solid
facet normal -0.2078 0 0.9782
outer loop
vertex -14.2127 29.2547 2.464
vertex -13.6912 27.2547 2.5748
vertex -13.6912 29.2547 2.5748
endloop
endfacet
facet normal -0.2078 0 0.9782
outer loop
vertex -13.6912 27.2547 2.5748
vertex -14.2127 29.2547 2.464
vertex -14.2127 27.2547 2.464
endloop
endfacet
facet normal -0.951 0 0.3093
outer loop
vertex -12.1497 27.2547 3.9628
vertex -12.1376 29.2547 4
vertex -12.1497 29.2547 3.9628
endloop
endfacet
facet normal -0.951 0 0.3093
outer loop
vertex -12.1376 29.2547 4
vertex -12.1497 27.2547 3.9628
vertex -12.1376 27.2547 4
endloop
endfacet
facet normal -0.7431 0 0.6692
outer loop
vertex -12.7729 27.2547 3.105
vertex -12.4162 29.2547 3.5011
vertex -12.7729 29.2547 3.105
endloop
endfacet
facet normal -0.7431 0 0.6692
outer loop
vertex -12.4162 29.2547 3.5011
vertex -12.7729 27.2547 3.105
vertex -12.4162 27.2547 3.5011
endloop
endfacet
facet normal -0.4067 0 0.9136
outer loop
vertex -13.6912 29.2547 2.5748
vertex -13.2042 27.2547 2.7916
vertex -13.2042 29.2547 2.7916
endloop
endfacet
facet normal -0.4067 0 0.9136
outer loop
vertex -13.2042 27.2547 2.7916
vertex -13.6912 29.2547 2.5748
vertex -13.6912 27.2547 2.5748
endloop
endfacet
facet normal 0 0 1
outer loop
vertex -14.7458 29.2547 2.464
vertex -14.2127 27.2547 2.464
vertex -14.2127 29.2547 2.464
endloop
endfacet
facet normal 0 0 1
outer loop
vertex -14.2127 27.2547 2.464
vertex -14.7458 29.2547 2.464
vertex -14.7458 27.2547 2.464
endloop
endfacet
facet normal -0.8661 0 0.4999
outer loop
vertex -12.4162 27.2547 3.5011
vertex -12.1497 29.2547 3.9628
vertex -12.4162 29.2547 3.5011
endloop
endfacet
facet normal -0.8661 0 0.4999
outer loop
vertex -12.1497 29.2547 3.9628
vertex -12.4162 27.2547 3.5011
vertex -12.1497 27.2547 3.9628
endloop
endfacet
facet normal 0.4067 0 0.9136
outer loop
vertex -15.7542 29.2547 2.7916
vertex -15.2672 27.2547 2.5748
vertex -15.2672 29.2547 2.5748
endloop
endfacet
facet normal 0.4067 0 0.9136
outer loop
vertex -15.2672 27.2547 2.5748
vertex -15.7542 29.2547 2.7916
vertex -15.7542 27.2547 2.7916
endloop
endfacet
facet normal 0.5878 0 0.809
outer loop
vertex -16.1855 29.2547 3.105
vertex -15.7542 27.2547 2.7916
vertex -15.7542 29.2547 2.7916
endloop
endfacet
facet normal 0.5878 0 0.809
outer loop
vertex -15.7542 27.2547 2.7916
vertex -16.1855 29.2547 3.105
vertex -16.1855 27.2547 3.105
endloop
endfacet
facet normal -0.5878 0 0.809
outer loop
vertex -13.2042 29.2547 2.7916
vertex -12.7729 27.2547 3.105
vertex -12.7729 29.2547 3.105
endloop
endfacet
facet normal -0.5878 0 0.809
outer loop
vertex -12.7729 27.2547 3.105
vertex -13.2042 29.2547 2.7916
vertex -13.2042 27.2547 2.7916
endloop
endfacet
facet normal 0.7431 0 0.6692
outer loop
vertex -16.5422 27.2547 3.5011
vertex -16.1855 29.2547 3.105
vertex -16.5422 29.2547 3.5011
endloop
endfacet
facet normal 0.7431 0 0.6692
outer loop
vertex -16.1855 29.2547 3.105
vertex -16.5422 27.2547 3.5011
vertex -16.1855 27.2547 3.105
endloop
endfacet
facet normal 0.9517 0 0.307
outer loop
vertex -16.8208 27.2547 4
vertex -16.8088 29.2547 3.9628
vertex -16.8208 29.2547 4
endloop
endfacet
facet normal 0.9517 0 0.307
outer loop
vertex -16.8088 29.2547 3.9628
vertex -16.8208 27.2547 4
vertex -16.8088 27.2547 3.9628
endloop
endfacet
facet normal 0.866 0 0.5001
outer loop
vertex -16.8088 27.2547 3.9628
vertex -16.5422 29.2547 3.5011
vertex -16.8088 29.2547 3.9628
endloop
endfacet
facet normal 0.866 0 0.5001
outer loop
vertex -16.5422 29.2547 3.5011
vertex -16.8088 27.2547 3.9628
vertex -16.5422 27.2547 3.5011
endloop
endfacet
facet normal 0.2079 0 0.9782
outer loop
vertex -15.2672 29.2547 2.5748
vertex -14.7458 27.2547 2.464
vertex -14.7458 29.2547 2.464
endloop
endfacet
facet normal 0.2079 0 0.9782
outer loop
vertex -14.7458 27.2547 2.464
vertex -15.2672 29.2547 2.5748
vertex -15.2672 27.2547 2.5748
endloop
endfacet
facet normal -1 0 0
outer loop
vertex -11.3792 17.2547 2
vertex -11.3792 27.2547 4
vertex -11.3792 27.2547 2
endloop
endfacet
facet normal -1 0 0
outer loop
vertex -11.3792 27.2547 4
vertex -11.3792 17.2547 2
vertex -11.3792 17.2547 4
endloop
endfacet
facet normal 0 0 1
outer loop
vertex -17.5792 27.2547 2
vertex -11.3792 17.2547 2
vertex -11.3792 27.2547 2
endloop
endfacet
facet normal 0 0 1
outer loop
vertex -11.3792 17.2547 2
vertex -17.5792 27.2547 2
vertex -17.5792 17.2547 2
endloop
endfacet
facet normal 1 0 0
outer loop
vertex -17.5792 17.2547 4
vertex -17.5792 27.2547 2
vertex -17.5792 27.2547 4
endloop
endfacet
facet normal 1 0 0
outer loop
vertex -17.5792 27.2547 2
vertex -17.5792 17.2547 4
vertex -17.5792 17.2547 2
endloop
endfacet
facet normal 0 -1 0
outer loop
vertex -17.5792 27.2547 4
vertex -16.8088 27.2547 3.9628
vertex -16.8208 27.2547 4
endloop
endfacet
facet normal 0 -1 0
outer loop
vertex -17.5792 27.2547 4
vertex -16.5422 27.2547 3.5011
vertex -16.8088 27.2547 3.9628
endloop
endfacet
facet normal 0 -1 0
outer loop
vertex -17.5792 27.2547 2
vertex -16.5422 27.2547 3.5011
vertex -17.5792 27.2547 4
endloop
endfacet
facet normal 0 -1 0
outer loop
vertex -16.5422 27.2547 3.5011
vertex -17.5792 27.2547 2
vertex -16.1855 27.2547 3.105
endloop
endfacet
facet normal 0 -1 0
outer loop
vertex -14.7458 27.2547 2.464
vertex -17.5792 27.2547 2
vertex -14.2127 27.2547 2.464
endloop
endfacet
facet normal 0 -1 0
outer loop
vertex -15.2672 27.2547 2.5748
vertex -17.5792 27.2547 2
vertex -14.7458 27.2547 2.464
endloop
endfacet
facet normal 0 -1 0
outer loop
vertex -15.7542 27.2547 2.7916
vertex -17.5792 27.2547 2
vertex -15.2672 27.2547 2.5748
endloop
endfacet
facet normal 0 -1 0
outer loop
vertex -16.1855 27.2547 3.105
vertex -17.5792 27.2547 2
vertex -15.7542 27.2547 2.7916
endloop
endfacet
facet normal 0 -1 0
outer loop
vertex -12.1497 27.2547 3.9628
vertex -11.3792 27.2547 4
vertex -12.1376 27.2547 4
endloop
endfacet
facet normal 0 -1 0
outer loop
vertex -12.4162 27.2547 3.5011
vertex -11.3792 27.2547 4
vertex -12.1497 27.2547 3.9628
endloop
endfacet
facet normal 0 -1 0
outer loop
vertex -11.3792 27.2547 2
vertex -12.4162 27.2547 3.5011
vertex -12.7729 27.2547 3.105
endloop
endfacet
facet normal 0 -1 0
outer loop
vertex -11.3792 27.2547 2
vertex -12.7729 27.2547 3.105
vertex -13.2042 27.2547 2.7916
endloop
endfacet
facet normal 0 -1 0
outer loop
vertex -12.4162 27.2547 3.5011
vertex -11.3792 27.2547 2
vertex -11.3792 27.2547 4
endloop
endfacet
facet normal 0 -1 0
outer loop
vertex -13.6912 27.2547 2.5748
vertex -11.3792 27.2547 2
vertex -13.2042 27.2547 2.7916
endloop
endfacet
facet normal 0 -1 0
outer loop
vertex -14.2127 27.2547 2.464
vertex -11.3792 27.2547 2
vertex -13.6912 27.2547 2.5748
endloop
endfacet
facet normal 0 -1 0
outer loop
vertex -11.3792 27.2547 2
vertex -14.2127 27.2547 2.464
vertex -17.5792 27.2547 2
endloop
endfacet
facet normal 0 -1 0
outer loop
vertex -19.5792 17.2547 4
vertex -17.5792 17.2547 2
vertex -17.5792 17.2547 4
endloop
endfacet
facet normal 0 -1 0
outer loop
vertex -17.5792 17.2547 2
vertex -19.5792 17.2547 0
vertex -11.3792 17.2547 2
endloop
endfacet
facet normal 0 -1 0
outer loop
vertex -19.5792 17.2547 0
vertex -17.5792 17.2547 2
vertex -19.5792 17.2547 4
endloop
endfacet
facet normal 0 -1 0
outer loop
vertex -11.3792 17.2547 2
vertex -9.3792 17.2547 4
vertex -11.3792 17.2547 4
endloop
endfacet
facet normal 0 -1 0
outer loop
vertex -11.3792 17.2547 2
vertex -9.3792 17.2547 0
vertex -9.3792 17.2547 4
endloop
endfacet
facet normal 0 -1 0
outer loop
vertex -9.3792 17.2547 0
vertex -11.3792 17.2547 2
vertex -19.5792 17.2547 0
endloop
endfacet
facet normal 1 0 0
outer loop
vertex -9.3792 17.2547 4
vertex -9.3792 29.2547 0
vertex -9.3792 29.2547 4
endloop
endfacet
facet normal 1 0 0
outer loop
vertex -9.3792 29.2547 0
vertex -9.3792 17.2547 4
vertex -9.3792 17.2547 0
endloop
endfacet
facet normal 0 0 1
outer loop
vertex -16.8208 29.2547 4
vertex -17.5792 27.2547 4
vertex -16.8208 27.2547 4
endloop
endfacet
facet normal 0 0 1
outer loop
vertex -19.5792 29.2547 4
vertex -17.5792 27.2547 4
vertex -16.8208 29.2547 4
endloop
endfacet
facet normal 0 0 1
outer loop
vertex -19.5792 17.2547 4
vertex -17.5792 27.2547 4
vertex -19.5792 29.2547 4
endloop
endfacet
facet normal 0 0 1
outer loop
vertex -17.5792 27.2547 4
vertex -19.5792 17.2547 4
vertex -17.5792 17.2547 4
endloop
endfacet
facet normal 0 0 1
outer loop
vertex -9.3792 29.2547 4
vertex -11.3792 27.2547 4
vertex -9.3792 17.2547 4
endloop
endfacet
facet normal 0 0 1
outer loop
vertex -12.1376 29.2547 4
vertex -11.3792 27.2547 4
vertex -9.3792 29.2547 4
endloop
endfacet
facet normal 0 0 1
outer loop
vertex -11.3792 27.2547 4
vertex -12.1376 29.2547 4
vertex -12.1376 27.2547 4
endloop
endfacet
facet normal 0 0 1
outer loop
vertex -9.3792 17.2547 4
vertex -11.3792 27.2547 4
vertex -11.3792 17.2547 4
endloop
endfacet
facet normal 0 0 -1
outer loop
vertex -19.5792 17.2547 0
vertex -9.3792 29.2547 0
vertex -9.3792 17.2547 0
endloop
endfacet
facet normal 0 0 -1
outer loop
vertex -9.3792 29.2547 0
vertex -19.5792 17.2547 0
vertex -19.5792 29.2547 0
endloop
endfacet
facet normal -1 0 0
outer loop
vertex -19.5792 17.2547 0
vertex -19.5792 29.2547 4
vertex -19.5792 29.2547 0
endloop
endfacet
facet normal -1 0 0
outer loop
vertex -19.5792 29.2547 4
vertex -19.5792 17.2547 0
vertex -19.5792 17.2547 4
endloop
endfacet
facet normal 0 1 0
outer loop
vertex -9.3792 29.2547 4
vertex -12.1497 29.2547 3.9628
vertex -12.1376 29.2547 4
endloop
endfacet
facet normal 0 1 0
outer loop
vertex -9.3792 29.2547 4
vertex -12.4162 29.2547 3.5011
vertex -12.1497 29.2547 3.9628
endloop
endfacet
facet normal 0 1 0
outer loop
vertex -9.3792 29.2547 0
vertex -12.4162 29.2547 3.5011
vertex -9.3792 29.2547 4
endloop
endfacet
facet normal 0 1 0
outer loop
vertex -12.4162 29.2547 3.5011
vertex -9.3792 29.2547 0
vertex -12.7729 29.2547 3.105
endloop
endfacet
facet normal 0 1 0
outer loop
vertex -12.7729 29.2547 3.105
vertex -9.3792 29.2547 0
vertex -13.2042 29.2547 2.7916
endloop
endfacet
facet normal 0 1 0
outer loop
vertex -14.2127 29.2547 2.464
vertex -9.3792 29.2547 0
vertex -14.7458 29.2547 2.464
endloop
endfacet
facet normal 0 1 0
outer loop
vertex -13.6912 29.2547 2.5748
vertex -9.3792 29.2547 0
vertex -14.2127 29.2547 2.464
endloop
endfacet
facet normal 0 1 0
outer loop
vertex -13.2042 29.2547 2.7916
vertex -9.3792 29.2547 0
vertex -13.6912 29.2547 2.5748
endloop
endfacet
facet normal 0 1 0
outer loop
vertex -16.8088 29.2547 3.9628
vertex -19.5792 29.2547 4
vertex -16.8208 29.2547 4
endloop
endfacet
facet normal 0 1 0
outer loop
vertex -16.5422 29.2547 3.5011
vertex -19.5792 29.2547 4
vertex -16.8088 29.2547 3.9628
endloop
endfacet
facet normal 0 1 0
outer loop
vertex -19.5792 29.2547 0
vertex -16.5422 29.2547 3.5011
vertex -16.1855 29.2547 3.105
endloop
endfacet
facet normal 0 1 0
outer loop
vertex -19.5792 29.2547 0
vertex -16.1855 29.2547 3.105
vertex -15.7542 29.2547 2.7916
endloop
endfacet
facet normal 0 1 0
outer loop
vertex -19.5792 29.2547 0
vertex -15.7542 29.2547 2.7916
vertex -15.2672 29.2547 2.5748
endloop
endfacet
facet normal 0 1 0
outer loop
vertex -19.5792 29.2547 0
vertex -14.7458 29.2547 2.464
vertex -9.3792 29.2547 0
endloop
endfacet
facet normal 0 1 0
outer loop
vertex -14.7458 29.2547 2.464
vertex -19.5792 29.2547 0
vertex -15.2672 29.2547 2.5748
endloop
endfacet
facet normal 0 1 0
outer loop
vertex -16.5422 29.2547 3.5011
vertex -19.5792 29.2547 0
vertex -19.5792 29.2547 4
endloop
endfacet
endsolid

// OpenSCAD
difference () {
  union () {
    translate ([-14.479213569371693, 23.254656725662173, 2]) {
      cube ([10.2, 12, 4], center=true);
    }
  }
  union () {
    translate ([-14.479213569371693, 29.254656725662173, 5]) {
      rotate (a=90.0, v=[1, 0, 0]) {
        cylinder ($fn=30, h=20, r=2.55, center=true);
      }
    }
    translate ([-14.479213569371693, 22.254656725662173, 5]) {
      cube ([6.2, 10, 6], center=true);
    }
  }
}
